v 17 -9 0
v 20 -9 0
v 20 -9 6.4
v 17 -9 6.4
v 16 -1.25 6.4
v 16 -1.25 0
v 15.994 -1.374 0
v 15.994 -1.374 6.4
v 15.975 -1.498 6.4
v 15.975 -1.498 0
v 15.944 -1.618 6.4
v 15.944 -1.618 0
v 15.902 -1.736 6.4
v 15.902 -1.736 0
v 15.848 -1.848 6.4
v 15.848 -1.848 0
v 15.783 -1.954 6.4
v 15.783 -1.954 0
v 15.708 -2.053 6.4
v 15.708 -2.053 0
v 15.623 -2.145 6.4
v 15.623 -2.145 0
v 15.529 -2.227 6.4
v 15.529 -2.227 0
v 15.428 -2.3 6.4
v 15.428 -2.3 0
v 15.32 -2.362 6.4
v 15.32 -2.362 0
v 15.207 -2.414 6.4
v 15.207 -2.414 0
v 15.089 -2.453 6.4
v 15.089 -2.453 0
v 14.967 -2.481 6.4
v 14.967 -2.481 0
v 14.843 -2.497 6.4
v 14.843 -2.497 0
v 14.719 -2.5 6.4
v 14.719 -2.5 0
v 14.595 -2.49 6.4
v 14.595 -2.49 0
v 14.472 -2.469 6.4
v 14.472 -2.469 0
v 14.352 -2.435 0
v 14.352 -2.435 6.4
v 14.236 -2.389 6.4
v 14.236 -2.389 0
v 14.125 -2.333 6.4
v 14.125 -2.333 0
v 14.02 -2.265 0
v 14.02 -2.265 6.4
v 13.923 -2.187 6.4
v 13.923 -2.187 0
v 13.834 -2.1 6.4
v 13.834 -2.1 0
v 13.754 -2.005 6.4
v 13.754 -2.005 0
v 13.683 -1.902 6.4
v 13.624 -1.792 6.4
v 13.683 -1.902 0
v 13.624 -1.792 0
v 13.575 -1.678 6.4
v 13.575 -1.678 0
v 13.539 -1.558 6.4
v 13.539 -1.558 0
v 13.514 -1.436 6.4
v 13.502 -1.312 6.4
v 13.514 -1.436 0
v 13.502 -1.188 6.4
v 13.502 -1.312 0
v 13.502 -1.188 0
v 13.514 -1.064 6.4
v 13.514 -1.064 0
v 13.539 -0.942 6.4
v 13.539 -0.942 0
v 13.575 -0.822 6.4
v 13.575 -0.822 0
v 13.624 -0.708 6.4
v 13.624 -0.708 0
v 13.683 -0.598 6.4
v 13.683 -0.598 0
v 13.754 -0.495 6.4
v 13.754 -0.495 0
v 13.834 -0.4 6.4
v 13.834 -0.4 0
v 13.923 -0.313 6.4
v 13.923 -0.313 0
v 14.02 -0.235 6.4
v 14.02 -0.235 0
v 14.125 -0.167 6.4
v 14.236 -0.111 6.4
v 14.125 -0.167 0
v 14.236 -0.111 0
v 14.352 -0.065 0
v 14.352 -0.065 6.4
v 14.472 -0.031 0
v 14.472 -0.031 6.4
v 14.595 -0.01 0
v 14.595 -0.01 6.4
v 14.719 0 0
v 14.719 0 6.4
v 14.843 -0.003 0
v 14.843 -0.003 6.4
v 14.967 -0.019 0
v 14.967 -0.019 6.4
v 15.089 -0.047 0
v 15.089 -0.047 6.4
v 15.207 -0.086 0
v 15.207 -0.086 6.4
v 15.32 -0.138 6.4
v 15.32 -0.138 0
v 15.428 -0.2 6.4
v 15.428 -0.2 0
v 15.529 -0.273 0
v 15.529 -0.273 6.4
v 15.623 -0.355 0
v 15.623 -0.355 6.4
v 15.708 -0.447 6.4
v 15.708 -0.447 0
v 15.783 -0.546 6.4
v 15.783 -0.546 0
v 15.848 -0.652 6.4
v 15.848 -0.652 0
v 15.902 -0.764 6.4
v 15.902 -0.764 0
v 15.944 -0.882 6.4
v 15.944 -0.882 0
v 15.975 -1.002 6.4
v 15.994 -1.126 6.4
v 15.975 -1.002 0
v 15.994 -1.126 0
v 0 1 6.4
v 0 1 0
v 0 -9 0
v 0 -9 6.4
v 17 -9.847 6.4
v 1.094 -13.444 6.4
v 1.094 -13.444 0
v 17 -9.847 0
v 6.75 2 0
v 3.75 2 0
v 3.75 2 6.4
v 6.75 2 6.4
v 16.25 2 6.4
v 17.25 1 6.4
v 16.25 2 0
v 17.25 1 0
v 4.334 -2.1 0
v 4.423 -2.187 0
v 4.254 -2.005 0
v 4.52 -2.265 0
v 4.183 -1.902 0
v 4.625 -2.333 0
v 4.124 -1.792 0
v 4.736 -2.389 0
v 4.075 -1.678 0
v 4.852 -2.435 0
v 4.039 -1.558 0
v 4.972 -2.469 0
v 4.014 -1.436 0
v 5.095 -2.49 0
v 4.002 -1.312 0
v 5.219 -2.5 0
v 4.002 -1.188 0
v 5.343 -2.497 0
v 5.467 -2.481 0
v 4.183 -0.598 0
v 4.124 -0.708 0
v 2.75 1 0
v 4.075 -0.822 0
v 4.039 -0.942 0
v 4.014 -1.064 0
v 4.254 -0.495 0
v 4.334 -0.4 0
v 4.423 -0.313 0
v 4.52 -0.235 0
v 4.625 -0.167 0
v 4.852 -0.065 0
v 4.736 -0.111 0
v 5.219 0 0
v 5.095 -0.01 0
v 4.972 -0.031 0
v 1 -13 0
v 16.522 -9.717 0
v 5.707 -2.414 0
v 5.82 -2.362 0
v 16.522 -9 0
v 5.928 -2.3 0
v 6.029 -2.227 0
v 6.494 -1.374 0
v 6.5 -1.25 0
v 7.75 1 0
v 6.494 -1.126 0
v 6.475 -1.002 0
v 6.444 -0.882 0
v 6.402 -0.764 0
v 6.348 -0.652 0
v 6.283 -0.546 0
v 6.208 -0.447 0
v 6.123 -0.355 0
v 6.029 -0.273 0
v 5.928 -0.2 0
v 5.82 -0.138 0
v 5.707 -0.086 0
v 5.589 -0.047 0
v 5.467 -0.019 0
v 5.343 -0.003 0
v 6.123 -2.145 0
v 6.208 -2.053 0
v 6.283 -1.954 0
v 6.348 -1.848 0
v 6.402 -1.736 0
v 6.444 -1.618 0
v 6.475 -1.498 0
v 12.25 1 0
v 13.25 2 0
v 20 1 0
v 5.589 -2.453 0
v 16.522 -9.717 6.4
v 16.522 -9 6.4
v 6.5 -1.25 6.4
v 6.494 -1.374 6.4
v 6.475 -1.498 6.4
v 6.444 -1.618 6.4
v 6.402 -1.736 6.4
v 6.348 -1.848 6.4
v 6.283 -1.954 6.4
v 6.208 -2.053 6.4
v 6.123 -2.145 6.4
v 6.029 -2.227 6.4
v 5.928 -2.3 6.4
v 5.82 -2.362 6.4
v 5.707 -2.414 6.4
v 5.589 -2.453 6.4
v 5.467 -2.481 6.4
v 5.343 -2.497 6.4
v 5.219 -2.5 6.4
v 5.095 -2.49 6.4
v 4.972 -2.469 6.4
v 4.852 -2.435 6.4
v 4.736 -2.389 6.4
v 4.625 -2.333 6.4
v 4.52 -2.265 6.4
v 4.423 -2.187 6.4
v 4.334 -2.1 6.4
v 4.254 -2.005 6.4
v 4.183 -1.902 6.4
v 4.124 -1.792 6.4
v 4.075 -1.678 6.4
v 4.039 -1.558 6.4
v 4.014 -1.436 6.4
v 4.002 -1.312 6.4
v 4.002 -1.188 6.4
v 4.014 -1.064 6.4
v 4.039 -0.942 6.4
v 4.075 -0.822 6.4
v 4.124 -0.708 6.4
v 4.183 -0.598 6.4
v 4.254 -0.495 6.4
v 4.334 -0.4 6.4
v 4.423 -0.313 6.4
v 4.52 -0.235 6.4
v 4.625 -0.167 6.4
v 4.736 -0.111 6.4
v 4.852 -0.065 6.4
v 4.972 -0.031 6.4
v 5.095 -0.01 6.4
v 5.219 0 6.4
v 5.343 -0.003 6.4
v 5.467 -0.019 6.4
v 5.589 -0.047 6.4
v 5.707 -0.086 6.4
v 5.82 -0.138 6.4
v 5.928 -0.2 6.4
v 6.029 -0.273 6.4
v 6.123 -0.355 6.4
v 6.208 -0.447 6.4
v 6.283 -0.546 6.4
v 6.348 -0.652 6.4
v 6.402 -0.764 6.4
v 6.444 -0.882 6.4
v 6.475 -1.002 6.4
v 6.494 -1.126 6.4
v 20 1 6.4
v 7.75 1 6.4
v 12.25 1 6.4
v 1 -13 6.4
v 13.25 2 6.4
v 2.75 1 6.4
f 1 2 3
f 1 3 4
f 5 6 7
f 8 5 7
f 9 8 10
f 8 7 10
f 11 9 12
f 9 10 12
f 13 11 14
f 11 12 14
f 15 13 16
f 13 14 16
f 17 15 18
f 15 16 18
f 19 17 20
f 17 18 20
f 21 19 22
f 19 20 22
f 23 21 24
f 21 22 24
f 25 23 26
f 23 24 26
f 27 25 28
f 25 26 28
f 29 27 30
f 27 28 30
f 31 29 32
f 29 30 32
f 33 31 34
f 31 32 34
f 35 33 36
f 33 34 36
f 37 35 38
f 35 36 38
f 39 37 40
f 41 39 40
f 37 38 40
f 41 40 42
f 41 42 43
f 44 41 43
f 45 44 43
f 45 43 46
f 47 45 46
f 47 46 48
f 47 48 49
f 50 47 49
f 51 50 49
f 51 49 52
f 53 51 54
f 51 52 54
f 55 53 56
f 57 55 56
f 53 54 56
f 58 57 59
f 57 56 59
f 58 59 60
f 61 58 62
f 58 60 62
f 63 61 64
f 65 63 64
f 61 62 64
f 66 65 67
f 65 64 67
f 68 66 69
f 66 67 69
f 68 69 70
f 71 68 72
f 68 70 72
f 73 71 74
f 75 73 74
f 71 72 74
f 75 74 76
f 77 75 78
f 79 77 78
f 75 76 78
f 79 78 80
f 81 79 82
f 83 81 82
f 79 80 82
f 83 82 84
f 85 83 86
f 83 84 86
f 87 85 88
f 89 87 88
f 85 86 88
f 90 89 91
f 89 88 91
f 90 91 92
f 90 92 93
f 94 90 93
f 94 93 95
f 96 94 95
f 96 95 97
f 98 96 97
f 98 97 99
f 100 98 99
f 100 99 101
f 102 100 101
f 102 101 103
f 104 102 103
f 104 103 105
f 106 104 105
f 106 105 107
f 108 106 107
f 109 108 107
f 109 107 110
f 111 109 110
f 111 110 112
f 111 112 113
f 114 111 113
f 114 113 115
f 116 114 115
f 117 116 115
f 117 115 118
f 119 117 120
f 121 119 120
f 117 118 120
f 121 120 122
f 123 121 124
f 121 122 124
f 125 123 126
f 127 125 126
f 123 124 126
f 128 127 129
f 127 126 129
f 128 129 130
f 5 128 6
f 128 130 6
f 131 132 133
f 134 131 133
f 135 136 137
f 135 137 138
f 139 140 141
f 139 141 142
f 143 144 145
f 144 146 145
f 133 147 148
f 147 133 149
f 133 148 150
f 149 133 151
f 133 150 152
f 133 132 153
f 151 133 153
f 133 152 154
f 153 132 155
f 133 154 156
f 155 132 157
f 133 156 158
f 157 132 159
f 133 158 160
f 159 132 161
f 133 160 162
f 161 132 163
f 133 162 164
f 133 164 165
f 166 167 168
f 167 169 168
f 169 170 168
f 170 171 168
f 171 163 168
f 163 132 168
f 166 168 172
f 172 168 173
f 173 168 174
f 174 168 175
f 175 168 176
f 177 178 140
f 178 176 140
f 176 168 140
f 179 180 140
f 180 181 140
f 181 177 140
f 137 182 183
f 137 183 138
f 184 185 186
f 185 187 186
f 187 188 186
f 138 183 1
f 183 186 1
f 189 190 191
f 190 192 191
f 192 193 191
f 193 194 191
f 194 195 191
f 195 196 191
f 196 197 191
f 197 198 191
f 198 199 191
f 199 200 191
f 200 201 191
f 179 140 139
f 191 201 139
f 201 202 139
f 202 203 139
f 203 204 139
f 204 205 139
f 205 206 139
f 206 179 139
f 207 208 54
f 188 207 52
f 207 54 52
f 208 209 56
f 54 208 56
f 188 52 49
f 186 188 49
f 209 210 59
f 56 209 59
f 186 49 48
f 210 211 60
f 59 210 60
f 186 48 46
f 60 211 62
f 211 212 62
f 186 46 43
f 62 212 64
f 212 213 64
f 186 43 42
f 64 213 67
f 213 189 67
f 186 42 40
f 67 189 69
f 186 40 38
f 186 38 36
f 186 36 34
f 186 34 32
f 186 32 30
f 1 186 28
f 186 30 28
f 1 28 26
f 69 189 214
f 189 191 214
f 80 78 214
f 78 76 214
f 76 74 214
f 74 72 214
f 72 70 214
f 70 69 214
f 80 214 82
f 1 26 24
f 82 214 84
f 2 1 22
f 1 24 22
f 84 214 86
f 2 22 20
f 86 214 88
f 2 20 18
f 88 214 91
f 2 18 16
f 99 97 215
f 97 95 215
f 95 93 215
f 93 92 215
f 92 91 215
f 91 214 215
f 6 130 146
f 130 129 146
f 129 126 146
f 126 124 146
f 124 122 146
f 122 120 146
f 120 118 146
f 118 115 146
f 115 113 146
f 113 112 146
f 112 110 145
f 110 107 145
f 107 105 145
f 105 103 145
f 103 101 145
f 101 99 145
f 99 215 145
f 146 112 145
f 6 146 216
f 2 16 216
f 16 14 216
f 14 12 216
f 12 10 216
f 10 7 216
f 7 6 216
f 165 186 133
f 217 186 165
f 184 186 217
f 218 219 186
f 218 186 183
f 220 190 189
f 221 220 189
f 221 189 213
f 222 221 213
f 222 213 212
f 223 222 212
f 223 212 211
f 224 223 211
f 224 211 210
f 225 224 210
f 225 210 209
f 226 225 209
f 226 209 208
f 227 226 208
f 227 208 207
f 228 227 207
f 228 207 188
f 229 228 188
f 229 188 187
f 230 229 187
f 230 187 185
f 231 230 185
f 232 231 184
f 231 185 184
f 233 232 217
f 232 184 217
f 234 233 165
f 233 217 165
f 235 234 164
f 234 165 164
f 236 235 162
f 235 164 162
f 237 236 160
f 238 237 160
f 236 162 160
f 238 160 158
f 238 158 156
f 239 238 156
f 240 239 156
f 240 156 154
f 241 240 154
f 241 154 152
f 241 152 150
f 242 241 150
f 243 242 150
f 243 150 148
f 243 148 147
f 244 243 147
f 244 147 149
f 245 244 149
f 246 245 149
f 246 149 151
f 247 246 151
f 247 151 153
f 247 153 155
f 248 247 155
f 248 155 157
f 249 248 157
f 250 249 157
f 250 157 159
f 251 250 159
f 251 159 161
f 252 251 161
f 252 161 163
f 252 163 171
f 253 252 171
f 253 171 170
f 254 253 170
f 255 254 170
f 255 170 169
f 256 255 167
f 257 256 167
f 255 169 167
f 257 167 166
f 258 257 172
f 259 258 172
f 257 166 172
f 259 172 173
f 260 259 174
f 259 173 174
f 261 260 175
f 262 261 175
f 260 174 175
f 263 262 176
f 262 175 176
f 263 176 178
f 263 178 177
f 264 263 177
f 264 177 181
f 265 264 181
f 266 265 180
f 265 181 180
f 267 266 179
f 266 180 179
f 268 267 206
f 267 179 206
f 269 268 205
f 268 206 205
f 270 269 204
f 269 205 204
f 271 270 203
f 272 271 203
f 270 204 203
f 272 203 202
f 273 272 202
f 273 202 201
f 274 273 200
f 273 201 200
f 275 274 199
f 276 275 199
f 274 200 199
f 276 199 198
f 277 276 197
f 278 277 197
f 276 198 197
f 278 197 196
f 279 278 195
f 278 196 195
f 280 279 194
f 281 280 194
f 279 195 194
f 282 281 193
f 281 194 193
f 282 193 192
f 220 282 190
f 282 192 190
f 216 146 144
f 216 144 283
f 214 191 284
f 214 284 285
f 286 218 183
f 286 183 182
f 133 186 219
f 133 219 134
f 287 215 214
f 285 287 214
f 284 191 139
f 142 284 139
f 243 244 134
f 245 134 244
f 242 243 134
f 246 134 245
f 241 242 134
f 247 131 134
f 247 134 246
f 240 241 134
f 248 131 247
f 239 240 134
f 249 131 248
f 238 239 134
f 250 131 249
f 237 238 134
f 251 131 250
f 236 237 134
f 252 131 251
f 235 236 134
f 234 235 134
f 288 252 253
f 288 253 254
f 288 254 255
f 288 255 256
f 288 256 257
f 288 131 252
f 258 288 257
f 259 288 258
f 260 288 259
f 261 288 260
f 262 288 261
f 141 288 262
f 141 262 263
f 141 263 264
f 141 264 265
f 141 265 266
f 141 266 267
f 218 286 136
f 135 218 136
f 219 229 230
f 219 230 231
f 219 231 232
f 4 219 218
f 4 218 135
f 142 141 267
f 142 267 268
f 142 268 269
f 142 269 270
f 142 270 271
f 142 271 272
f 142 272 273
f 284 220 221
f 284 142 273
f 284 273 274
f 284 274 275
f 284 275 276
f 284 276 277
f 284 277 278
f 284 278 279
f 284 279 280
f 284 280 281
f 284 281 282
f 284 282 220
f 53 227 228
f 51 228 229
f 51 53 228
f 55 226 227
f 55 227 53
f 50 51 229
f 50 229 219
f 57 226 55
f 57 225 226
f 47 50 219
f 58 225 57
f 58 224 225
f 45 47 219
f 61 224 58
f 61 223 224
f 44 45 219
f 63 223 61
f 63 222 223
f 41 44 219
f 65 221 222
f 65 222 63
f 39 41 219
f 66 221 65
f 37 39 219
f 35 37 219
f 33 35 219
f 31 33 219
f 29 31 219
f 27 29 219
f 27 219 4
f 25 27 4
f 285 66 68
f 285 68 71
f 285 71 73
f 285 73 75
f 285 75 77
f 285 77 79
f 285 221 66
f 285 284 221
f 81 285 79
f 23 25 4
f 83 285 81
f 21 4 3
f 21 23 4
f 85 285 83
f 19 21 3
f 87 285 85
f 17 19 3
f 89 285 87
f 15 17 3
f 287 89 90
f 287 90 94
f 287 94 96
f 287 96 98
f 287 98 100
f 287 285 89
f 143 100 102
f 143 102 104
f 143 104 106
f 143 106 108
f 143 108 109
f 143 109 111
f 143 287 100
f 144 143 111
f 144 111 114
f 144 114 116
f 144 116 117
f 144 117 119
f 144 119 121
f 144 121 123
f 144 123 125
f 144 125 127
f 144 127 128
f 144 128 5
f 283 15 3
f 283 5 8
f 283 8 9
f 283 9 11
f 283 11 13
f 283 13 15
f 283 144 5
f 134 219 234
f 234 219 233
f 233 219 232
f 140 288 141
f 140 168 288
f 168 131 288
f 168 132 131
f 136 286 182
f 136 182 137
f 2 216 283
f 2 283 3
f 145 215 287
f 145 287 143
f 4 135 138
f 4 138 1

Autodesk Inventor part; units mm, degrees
ref_plane "YZ Plane" through (0, 0, 0) normal (1, 0, 0) x (0, 1, 0)
ref_plane "XZ Plane" through (0, 0, 0) normal (0, 1, 0) x (-1, 0, 0)
ref_plane "XY Plane" through (0, 0, 0) normal (0, 0, 1) x (1, 0, 0)
sketch "Sketch1" plane through (0, 0, 0) normal (0, 0, 1) x (1, 0, 0)
  line L0 (13.5, -2.5) -> (13.5, 0) projected
  line L1 (12, 0) -> (13.5, 0) projected
  line L2 (12, 0) -> (12, -2) projected
  arc A0 (8, -2) -> (12, -2) centre (10, -2) ccw projected
  line L3 (8, -2) -> (8, 0) projected
  line L4 (6.5, 0) -> (8, 0) projected
  line L5 (6.5, 0) -> (6.5, -2.5) projected
  line L6 (6.5, -2.5) -> (4, -2.5) projected
  line L7 (4, -2.5) -> (4, 0) projected
  line L8 (0, 0) -> (4, 0) projected
  line L9 (0, 0) -> (0, -8) projected
  line L10 (20, -8) -> (0, -8) projected
  line L11 (20, 0) -> (20, -8) projected
  line L12 (16, 0) -> (20, 0) projected
  line L13 (16, 0) -> (16, -2.5) projected
  line L14 (16, -2.5) -> (13.5, -2.5) projected
  circle A1 centre (5.25, -1.25) radius 1.25
  circle A2 centre (14.75, -1.25) radius 1.25
  line L15 (20, 1) -> (20, -9)
  line L16 (20, -9) -> (0, -9)
  line L17 (0, -9) -> (0, 1)
  line L18 (0, 1) -> (20, 1)
  line L19 (17.25, 1) -> (16.25, 2)
  line L20 (13.25, 2) -> (12.25, 1)
  line L21 (7.75, 1) -> (6.75, 2)
  line L22 (2.75, 1) -> (3.75, 2)
  line L23 (3.75, 2) -> (6.75, 2)
  line L24 (13.25, 2) -> (16.25, 2)
  dimension "d0" = 9
  dimension "d3" = 45
  dimension "d4" = 45
  dimension "d5" = 45
  dimension "d6" = 3
  dimension "d7" = 3
  dimension "d8" = 1.5
  dimension "d9" = 2.5
  dimension "d10" = 2.5
  dimension "d11" = 1.5
extrude "Extrusion1" add sketch "Sketch1" along normal blind 6.4 contours L14 L13 L12 L11 L10 L9 L8 L7 L6 L5 L4 L3 A0 L2 L1 L0 | L0 A2 L14 | L0 L1 L2 A0 L3 L4 L5 A1 L7 L8 L17 L18 L15 L12 L13 A2 | A2 L13 L14 | L15 L16 L17 L10 | L18 L20 L24 L19 | L5 L6 A1 | L18 L22 L23 L21 | A1 L6 L7
sketch "Sketch2" plane through (0, 0, 6.4) normal (0, 0, 1) x (1, 0, 0)
  line L0 (0, -9) -> (20, -9) projected
  line L1 (20, 1) -> (17.25, 1) projected
  line L2 (16.5219, -9) -> (16.5219, -9.7169)
  line L3 (16.5219, -9.7169) -> (1, -13)
  line L4 (1, -13) -> (1.0938, -13.4435)
  line L5 (1.0938, -13.4435) -> (17, -9.8474)
  line L6 (17, -9.8474) -> (17, -9)
  point P0 (0, 0)
extrude "Extrusion2" add sketch "Sketch2" against normal blind 6.4
properties material "ABS Plastic"
